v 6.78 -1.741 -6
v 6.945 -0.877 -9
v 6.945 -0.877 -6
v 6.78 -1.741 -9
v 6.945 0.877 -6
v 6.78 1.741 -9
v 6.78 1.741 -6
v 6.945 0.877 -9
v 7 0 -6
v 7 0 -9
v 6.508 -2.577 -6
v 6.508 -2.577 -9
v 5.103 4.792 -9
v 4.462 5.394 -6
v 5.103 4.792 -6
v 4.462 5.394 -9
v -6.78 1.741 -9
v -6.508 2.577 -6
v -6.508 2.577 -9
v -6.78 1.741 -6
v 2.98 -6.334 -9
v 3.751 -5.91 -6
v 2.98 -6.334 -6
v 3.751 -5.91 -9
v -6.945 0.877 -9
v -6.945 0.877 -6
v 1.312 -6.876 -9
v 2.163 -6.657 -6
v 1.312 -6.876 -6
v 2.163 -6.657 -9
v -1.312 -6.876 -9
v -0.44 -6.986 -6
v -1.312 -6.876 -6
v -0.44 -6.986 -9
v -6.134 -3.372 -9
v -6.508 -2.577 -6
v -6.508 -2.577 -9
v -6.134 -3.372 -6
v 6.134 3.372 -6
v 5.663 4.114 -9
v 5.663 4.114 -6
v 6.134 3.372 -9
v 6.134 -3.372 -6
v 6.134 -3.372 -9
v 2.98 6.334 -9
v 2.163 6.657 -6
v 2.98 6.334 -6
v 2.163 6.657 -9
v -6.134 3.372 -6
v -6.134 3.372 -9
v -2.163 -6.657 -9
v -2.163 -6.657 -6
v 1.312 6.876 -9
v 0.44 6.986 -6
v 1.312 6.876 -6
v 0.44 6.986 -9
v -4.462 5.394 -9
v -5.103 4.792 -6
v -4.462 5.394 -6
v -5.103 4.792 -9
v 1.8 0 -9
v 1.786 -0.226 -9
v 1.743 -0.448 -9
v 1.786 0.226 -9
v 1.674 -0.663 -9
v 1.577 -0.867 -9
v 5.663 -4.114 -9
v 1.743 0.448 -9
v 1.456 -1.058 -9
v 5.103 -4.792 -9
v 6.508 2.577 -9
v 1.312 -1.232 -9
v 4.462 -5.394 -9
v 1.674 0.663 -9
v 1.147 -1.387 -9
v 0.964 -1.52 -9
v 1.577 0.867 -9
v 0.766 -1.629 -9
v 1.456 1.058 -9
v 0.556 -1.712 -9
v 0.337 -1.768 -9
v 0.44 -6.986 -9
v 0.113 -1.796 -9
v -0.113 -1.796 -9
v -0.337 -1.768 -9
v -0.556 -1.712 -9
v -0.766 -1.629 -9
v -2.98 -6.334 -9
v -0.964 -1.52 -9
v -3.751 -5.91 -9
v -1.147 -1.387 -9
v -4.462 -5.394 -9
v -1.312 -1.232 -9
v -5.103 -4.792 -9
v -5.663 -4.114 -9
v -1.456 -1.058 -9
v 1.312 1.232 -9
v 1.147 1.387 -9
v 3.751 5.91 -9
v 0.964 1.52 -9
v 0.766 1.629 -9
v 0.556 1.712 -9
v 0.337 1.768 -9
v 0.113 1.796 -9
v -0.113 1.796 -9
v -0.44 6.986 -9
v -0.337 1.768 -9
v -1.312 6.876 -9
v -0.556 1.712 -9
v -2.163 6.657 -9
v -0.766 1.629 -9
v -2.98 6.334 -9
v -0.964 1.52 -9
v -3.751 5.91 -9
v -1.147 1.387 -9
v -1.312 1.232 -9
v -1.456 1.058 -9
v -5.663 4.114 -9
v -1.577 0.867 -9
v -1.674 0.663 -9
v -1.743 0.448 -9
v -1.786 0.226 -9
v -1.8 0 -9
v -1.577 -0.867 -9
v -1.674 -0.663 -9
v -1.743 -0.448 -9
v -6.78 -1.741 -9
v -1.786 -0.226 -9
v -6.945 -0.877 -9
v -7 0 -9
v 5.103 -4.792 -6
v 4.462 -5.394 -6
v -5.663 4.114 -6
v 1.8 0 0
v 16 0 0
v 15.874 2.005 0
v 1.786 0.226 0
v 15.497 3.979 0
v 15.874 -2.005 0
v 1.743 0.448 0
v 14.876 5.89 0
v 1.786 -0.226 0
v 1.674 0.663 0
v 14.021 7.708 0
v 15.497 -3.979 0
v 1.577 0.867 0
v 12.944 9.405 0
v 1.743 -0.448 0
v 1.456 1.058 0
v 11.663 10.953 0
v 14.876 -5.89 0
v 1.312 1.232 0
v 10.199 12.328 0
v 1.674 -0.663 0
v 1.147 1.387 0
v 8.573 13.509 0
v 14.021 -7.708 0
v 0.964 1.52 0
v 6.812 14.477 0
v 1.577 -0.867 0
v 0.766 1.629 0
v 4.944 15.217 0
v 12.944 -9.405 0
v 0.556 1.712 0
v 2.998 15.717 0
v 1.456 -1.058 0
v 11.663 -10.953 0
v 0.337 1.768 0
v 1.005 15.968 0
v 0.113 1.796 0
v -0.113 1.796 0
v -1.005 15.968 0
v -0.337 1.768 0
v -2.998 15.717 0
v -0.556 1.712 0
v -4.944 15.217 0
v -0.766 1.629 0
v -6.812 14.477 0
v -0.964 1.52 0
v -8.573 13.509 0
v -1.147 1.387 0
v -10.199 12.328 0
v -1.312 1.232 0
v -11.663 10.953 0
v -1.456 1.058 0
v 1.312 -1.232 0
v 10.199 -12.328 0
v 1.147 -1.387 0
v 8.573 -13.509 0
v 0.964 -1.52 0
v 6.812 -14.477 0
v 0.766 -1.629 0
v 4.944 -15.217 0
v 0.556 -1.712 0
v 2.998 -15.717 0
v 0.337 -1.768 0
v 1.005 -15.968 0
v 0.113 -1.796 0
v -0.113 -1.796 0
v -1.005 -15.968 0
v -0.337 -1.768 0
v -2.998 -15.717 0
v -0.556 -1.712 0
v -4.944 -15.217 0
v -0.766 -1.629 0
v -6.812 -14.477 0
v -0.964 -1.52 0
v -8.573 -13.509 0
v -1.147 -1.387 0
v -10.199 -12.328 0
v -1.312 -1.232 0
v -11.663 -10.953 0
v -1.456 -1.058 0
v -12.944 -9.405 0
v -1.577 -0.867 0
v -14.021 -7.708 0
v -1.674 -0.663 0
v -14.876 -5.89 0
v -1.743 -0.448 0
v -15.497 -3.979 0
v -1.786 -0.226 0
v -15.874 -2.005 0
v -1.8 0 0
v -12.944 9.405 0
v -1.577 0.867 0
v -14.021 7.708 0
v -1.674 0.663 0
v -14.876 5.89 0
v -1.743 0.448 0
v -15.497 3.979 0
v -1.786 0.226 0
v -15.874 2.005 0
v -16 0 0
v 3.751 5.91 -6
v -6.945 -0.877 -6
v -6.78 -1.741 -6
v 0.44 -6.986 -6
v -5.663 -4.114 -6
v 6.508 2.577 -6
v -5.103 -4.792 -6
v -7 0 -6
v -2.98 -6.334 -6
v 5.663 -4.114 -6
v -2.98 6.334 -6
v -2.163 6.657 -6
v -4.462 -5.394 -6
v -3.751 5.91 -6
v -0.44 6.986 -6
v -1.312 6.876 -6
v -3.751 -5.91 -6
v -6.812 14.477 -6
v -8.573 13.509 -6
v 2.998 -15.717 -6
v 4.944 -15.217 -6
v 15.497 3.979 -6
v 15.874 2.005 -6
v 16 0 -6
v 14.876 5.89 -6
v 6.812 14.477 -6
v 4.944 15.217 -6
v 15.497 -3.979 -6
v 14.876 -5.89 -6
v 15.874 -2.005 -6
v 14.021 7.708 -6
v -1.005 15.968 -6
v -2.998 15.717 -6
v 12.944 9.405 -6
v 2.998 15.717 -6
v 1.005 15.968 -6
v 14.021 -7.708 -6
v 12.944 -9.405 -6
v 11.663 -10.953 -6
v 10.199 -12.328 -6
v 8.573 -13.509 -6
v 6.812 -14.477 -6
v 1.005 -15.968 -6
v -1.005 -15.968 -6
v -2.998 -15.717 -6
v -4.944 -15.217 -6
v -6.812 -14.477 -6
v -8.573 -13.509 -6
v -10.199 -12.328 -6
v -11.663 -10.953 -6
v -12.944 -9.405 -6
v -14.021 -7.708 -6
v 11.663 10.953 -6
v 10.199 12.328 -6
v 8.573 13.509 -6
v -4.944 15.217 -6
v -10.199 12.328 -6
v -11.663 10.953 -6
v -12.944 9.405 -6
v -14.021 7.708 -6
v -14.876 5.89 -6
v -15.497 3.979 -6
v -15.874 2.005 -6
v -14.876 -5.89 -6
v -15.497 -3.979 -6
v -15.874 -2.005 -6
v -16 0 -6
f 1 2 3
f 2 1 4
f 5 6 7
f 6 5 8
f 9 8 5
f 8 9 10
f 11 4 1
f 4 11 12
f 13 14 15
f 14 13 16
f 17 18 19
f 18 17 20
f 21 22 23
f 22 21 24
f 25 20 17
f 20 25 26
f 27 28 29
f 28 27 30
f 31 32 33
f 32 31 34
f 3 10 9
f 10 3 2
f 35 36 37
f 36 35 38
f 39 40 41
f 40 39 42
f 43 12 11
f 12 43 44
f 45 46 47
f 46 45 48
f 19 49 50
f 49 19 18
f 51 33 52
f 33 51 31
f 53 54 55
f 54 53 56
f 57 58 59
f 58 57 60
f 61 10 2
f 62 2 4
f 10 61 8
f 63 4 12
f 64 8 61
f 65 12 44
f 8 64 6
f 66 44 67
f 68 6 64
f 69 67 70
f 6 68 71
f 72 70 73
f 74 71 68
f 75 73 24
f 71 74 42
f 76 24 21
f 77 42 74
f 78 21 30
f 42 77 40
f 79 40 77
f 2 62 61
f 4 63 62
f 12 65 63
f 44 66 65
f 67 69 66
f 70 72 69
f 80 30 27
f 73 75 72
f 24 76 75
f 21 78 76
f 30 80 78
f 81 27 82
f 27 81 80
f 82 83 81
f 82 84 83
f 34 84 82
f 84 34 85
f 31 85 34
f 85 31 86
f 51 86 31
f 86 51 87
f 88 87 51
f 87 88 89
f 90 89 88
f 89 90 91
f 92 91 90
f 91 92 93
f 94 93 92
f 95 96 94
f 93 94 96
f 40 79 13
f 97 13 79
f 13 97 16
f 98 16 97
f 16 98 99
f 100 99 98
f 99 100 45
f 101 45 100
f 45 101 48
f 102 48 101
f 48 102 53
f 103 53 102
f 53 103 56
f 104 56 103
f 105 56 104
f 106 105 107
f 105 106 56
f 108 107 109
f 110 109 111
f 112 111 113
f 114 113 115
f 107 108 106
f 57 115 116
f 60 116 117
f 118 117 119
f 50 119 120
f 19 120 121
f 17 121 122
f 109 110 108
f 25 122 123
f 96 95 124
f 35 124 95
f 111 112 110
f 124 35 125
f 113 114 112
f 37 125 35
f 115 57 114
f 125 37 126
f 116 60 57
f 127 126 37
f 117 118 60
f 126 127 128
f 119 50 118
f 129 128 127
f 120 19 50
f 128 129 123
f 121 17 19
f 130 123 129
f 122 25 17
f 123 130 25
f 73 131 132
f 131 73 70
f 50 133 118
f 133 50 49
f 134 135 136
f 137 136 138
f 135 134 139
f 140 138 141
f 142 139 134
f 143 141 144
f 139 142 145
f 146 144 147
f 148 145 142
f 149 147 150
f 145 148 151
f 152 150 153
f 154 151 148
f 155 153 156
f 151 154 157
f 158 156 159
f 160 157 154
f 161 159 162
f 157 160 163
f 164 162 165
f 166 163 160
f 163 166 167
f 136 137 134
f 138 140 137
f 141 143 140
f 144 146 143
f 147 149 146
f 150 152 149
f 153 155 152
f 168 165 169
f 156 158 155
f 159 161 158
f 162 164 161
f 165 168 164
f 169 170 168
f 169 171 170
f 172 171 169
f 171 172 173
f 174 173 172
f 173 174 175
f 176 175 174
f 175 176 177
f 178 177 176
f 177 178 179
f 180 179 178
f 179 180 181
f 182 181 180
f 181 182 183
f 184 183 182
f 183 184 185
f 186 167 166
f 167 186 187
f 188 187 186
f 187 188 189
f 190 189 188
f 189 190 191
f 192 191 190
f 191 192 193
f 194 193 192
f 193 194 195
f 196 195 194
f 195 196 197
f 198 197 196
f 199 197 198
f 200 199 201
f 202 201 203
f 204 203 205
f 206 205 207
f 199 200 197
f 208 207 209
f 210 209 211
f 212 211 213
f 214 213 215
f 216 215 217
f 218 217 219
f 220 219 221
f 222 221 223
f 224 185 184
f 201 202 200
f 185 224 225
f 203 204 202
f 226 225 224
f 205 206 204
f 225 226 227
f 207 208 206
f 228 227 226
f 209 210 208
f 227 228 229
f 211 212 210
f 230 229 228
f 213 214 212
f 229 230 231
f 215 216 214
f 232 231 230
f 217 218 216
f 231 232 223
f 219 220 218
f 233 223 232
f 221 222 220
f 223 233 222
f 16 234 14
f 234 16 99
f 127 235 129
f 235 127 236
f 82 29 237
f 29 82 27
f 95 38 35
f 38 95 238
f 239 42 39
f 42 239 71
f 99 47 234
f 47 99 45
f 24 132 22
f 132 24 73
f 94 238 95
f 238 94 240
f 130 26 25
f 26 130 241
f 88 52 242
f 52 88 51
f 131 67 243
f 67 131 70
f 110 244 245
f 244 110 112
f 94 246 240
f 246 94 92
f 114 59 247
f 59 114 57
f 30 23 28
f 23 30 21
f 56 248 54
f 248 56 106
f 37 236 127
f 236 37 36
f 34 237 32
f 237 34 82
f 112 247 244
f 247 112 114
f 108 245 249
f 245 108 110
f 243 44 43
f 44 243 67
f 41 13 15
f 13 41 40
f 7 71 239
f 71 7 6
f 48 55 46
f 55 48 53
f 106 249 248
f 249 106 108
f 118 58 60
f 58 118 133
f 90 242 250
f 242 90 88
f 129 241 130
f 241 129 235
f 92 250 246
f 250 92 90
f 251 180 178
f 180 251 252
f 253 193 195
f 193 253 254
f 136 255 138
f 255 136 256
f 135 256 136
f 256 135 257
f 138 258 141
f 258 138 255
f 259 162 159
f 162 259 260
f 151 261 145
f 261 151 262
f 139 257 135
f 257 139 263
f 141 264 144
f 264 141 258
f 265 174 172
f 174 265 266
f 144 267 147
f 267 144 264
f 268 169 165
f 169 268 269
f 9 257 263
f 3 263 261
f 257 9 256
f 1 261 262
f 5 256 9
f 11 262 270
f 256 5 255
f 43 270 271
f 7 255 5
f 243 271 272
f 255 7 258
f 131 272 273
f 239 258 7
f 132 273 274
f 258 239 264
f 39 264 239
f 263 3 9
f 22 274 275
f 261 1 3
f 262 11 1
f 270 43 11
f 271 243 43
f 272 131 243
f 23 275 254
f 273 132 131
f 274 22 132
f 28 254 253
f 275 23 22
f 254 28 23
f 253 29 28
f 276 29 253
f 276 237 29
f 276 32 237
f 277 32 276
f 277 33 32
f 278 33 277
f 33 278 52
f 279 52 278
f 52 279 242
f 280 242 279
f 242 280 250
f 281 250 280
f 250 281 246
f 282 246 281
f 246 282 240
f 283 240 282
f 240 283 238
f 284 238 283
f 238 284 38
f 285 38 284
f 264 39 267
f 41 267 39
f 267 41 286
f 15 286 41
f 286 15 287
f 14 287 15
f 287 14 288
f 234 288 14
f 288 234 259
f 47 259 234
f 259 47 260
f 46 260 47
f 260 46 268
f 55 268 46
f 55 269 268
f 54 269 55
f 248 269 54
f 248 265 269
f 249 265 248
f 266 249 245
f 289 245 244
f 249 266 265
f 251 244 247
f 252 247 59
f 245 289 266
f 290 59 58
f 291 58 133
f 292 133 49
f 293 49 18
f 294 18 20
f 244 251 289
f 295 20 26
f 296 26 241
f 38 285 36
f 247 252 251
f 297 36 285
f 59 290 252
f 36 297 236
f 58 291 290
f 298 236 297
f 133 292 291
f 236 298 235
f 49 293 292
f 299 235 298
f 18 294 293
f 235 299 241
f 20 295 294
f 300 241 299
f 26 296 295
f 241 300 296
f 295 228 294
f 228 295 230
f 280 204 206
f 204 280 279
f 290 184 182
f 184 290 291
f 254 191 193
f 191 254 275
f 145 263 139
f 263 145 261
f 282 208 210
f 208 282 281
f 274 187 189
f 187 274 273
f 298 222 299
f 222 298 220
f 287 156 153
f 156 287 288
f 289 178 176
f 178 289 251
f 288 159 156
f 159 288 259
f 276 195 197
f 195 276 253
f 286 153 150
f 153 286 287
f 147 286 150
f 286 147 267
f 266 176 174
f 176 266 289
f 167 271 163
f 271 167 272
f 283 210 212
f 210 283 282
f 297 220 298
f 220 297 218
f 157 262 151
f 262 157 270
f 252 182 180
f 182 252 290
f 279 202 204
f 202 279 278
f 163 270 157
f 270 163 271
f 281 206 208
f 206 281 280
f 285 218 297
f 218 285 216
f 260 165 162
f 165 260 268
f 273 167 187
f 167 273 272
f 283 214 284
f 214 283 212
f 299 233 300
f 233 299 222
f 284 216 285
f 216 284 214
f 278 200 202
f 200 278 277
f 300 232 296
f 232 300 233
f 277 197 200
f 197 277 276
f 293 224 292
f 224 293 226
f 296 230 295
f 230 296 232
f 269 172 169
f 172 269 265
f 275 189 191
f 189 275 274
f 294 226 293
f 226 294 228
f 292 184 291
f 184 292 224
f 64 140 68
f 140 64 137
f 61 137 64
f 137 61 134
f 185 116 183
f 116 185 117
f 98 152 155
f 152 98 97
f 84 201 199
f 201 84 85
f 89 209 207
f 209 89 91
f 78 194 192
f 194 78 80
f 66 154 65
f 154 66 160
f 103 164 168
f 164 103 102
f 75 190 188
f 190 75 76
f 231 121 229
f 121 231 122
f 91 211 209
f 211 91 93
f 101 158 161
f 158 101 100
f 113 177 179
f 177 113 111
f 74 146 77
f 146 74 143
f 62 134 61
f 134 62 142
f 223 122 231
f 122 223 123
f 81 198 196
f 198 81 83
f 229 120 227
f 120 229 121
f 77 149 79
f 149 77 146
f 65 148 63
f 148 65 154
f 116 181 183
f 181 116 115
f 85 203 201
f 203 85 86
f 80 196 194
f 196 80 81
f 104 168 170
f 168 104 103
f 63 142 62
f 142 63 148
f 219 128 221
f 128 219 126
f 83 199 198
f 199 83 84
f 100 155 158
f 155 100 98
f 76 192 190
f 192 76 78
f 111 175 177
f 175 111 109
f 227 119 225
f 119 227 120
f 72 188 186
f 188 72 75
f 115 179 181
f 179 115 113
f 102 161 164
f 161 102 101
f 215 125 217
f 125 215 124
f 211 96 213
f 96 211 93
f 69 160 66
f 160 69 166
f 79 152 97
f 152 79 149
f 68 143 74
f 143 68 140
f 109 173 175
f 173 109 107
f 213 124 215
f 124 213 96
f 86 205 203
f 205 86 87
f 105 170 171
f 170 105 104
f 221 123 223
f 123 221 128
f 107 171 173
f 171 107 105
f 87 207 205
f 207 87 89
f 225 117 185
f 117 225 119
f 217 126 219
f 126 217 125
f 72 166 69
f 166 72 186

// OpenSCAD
$fn = 50;


difference() {
	union() {
		translate(v = [0, 0, -9.0000000000]) {
			cylinder(h = 9, r = 7.0000000000);
		}
		translate(v = [0, 0, -6.0000000000]) {
			cylinder(h = 6, r = 16.0000000000);
		}
	}
	union() {
		#translate(v = [0, 0, -9]) {
			cylinder(h = 9, r = 1.8000000000);
		}
	}
}
